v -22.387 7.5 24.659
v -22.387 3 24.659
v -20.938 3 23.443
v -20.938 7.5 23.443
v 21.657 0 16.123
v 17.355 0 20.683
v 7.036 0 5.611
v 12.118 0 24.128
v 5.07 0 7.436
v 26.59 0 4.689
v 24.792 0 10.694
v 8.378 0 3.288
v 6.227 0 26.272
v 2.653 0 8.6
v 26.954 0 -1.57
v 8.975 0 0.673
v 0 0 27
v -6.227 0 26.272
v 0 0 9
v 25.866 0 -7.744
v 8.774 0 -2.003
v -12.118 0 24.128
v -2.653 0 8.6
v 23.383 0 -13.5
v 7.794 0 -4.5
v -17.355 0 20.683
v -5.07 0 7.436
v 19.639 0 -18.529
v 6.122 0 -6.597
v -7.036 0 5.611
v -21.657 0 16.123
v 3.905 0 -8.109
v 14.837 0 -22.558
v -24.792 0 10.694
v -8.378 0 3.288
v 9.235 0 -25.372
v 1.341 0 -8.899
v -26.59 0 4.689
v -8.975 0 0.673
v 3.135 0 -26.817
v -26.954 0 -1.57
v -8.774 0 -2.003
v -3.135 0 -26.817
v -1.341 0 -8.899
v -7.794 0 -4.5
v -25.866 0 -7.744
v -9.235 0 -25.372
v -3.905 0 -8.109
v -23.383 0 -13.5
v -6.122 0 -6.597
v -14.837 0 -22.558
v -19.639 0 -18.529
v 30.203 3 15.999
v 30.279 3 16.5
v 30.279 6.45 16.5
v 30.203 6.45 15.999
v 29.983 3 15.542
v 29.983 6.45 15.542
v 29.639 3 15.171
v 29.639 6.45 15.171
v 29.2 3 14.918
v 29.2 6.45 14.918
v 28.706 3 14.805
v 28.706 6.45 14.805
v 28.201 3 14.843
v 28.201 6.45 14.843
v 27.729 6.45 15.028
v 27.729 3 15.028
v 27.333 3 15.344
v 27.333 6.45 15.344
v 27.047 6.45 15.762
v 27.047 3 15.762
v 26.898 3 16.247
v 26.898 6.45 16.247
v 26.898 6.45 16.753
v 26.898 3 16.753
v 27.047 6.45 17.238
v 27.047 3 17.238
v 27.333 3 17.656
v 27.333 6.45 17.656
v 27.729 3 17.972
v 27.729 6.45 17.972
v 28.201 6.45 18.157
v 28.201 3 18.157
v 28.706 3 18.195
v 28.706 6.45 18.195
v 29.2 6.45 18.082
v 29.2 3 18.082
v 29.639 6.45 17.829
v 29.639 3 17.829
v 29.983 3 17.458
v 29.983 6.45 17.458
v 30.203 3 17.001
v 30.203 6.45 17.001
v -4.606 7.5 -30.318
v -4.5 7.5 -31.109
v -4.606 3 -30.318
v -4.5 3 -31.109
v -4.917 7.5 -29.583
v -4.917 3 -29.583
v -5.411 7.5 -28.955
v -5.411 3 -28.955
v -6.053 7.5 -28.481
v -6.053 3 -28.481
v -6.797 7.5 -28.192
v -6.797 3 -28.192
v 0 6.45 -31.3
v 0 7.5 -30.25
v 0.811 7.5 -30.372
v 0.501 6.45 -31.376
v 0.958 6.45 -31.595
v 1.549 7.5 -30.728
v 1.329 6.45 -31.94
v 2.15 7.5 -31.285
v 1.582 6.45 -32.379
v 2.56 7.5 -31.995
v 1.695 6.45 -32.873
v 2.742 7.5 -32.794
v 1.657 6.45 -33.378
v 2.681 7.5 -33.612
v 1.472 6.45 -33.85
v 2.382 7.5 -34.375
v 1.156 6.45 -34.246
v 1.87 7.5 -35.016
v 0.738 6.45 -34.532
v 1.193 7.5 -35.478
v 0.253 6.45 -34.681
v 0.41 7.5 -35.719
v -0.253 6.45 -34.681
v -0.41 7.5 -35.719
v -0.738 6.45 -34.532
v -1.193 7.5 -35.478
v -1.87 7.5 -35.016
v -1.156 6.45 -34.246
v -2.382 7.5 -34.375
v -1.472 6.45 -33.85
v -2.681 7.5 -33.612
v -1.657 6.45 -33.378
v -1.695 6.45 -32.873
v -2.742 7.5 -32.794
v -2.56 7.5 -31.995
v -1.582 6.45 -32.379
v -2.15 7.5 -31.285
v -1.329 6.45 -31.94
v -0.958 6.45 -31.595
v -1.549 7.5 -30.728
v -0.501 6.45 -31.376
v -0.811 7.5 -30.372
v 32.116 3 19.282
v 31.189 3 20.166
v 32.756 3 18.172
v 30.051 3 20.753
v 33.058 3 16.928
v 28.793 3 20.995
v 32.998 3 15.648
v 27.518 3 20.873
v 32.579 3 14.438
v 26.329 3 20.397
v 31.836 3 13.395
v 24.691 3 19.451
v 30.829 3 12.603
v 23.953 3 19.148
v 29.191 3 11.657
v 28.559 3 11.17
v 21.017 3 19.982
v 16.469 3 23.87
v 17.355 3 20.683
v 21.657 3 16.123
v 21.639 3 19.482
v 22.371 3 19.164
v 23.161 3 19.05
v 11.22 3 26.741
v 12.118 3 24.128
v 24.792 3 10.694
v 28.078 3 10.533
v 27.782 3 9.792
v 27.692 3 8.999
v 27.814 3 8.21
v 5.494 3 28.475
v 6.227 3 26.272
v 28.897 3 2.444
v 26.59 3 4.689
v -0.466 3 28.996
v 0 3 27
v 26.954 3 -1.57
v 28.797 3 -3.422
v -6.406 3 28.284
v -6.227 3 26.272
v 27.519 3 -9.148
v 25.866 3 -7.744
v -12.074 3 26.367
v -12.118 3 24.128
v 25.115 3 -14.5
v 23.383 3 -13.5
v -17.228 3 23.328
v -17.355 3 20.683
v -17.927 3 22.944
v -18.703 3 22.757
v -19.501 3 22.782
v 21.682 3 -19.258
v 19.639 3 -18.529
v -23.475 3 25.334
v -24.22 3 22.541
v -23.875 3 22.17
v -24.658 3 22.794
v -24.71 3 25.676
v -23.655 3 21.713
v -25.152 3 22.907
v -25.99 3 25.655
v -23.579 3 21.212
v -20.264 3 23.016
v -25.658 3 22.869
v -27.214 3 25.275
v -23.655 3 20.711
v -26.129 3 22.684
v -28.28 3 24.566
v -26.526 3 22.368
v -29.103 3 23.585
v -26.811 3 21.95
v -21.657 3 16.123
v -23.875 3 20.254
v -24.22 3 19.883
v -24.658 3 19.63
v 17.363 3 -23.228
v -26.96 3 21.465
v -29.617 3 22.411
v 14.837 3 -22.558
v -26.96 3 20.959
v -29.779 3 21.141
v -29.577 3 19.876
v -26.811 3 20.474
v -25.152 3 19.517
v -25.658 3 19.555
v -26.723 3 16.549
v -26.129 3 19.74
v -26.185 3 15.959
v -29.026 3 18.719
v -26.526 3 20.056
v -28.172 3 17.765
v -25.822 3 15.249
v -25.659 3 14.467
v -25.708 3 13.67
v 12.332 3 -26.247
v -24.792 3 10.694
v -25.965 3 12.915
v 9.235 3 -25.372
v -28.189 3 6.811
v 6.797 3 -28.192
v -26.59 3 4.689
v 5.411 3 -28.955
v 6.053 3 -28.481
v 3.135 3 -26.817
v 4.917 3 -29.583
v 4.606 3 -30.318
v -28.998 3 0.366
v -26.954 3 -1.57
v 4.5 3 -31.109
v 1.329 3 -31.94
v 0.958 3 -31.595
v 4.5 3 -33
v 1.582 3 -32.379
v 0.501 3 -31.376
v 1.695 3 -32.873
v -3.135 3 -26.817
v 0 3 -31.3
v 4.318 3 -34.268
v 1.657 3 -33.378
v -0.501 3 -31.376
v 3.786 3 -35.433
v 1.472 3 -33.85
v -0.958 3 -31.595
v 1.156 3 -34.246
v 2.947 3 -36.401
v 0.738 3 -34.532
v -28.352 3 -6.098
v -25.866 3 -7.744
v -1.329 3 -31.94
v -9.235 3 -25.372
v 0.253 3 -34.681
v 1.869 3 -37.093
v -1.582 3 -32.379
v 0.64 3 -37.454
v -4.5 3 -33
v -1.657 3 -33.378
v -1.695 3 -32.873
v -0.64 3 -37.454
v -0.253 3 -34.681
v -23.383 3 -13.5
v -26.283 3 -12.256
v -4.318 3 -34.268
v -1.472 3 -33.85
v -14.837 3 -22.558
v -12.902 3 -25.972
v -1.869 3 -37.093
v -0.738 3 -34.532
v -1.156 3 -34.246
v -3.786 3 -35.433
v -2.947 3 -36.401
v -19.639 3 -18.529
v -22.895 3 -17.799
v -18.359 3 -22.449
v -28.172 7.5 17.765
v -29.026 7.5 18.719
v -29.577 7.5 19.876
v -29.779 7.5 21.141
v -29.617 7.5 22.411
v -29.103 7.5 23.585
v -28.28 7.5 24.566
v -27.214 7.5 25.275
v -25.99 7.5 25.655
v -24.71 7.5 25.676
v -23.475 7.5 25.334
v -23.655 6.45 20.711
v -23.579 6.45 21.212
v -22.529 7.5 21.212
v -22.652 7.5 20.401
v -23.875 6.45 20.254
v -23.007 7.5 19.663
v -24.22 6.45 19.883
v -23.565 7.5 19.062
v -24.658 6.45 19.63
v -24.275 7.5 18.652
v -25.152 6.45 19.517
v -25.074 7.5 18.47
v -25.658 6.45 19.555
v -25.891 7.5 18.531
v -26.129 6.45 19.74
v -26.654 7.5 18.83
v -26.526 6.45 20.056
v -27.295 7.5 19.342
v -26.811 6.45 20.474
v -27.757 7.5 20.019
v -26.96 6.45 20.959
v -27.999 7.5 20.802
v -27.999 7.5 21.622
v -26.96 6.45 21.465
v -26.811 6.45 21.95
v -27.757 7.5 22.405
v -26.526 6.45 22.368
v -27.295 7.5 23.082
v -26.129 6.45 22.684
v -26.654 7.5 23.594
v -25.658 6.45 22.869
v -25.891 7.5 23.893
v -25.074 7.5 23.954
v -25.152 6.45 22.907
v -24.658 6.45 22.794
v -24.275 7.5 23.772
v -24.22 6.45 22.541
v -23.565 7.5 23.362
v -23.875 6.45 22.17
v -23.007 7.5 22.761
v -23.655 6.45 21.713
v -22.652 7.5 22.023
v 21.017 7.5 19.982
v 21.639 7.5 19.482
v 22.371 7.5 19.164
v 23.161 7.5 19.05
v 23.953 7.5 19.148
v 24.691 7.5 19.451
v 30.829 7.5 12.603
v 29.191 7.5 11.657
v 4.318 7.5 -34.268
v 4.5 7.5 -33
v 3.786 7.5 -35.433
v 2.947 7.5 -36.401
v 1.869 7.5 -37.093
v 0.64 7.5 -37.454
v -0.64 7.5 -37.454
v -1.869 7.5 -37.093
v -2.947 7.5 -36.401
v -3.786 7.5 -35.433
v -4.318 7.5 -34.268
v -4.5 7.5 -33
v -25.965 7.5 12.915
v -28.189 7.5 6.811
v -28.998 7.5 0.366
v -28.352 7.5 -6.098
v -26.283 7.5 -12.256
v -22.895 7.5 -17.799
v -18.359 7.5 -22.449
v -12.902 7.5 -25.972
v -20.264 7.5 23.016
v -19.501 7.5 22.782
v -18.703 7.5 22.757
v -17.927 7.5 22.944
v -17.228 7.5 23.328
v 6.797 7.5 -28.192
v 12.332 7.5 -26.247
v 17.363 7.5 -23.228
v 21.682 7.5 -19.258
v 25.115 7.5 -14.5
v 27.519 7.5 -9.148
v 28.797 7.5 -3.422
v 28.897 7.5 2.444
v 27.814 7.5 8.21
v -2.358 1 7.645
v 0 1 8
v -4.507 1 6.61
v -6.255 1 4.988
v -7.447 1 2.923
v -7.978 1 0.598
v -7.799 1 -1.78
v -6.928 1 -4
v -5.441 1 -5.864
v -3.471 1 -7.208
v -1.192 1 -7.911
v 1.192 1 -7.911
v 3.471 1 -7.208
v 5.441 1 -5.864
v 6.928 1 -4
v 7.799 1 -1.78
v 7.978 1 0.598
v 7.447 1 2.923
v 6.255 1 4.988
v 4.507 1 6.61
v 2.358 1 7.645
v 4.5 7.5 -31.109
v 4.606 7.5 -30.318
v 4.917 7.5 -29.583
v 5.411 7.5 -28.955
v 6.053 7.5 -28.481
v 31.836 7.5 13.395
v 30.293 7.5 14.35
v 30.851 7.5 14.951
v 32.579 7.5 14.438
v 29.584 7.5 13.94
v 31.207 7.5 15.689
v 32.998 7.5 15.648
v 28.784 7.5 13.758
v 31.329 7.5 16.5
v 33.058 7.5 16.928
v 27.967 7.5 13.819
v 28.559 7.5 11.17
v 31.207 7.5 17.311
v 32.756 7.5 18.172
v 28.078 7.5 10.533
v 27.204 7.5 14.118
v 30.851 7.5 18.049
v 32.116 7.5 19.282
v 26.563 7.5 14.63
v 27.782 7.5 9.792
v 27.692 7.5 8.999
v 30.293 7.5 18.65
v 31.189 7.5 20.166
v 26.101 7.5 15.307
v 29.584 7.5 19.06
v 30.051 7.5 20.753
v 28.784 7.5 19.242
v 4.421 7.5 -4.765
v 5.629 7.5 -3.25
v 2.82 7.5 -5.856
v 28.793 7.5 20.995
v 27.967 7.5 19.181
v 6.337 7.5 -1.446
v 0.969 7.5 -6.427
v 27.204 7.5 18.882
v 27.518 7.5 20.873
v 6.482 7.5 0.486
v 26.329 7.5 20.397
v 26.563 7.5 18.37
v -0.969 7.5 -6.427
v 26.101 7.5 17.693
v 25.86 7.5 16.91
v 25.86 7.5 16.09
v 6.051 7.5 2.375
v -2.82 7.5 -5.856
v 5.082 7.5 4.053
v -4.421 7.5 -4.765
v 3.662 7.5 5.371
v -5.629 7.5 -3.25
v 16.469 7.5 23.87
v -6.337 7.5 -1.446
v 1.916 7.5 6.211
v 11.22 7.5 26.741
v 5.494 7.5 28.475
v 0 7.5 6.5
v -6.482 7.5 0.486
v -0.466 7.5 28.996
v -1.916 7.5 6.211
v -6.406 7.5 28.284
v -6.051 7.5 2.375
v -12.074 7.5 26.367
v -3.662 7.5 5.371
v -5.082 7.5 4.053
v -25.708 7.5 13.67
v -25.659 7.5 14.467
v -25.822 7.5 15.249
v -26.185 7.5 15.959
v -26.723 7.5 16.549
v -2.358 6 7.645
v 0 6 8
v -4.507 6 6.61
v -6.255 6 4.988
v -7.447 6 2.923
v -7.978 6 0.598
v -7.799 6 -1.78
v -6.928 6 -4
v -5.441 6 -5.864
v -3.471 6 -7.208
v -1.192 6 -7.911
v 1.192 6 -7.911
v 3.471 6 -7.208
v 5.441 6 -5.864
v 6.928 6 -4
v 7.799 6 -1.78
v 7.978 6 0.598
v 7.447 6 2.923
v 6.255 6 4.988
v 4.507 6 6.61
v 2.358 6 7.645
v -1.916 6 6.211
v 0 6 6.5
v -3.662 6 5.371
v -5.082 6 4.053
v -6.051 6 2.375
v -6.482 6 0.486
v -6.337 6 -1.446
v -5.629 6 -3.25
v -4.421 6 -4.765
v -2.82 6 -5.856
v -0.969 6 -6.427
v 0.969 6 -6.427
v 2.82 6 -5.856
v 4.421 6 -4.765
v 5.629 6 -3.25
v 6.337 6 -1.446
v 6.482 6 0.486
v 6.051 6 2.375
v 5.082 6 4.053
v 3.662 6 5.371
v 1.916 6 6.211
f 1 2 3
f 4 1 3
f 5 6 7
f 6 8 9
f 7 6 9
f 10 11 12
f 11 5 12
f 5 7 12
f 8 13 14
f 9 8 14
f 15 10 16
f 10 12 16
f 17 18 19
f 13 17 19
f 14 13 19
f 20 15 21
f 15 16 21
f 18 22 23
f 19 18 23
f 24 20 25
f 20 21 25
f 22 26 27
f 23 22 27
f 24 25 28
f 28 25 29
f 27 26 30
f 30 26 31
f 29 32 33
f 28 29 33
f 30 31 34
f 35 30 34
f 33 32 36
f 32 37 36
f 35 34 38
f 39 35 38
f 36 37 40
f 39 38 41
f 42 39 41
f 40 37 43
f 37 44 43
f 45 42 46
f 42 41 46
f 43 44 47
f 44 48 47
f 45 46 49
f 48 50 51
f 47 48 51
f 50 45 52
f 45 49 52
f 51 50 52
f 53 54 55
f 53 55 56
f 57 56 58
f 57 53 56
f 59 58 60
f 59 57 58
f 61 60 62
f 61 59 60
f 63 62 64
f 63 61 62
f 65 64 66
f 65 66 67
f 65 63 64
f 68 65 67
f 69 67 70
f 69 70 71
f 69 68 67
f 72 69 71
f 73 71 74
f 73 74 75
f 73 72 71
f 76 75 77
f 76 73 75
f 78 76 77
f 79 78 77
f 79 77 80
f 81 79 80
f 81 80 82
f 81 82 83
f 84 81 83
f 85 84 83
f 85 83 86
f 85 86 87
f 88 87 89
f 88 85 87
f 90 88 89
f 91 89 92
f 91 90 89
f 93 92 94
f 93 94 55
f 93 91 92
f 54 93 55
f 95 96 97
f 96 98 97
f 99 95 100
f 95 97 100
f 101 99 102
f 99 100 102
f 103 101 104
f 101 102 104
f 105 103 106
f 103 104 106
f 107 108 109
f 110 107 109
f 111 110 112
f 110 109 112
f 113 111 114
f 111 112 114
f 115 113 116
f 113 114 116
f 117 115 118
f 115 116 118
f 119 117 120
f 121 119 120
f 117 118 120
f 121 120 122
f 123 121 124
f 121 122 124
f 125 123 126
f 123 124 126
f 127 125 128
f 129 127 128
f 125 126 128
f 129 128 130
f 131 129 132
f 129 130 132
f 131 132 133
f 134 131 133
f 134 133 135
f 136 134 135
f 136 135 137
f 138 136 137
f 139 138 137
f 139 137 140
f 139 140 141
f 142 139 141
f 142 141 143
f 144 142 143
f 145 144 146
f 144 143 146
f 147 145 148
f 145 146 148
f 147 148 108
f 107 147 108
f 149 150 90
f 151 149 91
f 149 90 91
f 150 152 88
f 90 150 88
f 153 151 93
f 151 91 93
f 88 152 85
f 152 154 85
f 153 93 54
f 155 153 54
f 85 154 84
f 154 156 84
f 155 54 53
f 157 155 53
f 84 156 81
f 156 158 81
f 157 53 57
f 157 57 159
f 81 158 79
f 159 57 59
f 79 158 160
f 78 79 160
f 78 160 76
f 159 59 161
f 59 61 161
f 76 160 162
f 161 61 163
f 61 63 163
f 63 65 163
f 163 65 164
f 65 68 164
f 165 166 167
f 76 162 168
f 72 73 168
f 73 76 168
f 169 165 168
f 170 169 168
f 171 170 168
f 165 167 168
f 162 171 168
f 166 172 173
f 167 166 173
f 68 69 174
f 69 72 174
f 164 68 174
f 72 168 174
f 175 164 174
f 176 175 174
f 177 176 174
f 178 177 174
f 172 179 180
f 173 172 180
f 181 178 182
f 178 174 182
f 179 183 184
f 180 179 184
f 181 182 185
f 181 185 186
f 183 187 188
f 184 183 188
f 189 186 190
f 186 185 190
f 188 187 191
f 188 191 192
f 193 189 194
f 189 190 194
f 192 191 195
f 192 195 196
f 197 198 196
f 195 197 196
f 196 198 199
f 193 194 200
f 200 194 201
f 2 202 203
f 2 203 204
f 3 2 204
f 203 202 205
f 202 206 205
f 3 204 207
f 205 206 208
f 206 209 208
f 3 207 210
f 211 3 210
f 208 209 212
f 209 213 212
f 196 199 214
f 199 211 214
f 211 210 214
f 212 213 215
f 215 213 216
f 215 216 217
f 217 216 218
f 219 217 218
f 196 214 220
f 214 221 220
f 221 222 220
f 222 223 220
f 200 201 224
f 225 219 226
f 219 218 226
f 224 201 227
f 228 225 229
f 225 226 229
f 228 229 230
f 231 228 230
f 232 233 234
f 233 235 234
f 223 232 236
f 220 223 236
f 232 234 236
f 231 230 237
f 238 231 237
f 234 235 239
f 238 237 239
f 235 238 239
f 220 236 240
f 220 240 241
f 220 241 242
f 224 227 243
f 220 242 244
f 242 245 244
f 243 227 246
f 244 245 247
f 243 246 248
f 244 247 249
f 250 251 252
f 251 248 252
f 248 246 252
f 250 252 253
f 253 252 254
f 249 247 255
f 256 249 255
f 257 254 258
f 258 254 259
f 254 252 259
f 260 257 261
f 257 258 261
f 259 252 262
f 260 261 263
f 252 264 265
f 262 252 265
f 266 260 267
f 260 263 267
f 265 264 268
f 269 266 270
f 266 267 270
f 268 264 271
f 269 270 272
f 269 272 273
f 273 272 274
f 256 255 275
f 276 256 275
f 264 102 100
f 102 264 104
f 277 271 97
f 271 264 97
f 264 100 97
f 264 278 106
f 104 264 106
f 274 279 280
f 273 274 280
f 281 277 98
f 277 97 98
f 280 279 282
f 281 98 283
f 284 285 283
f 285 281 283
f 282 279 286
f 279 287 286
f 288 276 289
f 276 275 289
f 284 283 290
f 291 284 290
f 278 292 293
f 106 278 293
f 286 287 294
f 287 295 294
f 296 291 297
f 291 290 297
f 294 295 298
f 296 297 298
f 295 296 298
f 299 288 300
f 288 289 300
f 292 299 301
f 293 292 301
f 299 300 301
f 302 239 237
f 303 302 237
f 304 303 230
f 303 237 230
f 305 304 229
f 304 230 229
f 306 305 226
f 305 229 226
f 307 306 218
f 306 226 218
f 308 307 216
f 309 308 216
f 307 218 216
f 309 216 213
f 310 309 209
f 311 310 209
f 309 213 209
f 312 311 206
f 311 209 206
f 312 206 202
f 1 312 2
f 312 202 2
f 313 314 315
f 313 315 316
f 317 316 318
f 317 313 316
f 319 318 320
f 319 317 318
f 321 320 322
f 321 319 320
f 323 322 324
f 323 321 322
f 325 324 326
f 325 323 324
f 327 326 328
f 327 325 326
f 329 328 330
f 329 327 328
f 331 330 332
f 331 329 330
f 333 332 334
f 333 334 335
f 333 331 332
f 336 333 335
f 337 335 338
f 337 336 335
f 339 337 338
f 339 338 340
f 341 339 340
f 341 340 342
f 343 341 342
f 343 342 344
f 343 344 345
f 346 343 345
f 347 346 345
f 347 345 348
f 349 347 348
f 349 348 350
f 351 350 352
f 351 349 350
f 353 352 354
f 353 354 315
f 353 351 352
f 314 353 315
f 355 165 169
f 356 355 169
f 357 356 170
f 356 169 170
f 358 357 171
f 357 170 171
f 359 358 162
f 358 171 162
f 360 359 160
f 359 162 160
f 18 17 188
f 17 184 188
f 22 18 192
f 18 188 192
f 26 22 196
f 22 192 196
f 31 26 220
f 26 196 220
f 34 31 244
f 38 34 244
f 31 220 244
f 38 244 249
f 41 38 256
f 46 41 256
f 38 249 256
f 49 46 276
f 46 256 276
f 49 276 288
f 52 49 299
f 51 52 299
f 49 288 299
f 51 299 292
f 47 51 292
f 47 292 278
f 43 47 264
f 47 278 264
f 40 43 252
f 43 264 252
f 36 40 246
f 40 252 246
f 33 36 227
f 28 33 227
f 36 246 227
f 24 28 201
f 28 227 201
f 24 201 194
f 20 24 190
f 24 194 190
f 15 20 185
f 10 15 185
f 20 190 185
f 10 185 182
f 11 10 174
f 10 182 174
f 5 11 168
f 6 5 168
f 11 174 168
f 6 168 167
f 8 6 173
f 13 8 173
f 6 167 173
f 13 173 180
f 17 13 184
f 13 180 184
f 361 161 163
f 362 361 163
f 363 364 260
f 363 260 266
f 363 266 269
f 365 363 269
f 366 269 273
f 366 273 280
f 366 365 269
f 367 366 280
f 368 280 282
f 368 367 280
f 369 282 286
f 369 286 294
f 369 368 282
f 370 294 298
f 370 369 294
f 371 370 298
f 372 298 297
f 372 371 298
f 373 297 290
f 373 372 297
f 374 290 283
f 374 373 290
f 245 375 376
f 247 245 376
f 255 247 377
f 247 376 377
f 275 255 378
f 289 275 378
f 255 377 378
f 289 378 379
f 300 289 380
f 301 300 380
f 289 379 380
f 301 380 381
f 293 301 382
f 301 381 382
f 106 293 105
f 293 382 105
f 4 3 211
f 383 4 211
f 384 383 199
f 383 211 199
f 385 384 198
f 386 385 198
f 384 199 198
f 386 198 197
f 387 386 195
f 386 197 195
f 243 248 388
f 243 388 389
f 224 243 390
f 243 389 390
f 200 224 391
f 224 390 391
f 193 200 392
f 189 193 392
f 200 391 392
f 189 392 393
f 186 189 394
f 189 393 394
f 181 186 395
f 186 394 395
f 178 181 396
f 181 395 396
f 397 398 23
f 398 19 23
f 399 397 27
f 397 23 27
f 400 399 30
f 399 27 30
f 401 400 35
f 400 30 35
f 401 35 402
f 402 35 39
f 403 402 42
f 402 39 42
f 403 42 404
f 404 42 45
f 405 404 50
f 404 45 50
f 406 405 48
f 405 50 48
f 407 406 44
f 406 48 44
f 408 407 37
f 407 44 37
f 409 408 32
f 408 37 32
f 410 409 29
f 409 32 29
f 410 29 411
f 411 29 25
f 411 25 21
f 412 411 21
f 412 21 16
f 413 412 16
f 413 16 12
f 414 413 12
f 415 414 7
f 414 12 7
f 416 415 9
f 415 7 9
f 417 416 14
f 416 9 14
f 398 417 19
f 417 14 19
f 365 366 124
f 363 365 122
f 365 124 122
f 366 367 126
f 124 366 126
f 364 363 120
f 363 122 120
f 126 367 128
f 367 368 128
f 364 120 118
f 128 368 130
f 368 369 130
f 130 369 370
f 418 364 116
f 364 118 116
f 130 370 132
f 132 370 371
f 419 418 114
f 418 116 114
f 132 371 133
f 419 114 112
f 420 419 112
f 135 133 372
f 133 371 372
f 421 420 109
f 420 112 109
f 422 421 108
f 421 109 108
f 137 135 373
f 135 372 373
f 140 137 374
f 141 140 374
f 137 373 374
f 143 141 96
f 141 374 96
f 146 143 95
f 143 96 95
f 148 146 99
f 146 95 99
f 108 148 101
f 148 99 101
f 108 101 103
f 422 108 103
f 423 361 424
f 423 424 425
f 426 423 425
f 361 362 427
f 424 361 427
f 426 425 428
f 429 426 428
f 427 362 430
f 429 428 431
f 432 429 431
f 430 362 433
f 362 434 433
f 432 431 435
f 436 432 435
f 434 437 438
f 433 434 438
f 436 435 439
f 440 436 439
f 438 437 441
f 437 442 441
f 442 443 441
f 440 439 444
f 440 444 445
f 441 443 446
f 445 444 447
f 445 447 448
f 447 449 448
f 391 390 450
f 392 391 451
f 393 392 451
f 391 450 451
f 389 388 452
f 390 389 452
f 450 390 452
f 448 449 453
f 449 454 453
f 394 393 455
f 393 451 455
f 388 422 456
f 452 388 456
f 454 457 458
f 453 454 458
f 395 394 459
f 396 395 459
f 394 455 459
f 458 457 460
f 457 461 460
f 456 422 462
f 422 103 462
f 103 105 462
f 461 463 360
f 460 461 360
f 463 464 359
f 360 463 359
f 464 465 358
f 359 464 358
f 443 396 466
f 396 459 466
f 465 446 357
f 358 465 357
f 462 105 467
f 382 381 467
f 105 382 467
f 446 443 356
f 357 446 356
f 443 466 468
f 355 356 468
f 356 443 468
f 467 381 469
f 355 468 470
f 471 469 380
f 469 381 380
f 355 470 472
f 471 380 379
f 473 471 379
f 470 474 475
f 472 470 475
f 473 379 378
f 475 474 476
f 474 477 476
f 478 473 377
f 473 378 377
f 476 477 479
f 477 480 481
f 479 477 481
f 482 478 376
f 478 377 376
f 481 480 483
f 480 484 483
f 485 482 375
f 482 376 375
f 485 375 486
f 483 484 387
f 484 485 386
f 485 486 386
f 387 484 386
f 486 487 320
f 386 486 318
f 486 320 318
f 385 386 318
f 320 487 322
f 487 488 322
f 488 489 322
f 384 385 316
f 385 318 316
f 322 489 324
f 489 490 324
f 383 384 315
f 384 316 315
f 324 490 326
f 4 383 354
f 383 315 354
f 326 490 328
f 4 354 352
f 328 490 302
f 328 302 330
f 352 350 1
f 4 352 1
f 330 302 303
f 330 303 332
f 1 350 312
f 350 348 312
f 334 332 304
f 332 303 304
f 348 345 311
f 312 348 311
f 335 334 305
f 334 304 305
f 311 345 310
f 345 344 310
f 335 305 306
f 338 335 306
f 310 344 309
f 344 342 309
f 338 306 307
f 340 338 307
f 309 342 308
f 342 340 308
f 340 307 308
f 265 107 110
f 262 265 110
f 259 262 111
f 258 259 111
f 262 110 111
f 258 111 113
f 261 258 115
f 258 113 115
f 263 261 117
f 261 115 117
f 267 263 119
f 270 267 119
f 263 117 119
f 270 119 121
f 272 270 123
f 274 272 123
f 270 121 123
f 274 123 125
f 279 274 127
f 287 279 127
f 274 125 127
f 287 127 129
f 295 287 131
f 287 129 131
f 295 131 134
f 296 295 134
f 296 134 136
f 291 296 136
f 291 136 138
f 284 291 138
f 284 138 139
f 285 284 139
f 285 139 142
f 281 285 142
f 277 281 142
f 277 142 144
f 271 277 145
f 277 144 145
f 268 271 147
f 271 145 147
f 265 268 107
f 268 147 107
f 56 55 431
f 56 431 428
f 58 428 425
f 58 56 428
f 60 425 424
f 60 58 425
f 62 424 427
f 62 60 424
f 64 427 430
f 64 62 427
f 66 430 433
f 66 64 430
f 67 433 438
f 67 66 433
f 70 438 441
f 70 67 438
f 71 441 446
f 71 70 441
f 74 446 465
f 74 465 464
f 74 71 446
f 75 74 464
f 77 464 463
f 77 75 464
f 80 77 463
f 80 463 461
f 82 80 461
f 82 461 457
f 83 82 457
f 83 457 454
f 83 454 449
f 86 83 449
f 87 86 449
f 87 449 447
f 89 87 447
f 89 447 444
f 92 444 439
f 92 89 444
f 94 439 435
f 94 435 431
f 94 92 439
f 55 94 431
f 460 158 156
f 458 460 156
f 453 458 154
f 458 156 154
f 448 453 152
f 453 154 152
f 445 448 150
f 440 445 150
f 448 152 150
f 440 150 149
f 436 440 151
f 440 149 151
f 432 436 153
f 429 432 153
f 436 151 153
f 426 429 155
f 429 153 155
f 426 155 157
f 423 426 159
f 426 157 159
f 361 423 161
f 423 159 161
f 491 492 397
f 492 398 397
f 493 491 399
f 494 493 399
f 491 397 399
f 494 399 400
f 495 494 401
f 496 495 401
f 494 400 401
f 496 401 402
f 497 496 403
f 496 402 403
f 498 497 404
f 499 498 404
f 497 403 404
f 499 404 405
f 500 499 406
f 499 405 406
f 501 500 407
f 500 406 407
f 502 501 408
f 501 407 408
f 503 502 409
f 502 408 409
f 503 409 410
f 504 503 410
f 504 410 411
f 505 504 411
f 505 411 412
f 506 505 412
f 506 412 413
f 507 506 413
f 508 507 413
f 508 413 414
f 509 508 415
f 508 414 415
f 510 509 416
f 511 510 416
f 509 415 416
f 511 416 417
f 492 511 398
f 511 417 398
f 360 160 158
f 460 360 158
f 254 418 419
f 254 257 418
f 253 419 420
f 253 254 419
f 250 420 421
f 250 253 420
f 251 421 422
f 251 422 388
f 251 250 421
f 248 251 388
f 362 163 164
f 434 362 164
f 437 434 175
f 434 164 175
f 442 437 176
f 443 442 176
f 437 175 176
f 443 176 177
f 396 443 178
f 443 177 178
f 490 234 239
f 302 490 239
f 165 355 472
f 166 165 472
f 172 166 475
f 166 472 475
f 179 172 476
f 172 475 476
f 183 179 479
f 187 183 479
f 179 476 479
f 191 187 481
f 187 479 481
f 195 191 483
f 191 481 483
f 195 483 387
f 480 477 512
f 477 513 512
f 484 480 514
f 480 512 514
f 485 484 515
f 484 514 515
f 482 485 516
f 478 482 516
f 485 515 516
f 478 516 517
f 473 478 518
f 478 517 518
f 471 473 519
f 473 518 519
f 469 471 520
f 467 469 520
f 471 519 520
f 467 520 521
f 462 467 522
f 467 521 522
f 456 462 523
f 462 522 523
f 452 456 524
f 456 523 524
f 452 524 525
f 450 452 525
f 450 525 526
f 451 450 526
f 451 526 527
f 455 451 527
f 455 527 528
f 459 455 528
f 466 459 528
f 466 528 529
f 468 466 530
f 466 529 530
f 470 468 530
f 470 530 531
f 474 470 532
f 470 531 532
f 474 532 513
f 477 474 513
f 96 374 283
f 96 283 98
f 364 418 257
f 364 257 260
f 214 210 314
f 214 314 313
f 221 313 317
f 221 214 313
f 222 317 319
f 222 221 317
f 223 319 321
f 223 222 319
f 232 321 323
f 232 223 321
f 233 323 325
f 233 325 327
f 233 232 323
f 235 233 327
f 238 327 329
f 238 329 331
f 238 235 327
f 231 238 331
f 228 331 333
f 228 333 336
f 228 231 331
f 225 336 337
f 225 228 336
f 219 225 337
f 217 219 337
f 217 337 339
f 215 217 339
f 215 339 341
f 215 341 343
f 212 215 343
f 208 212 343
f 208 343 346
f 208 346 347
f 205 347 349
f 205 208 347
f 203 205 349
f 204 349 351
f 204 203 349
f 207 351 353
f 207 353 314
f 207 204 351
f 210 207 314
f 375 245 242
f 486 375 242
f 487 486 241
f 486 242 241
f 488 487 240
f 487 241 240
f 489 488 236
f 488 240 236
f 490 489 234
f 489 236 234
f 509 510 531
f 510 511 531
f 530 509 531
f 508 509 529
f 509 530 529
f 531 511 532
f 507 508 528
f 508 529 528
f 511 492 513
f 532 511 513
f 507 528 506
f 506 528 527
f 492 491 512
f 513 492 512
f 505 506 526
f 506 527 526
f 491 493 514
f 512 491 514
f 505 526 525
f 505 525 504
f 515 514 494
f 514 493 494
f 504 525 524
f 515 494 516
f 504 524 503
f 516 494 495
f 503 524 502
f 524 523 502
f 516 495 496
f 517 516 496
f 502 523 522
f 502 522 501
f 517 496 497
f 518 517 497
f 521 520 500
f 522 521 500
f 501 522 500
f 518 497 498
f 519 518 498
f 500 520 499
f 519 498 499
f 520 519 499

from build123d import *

# Parameters (mm, degrees)
ESQUISSE1_R                      = 1.7
BOSS_EXTRU_1_DEPTH               = 4.5
CONG_1_R                         = 3
R_P_TITION_START                 = 3
R_P_TITION_CIRCULAIRE1_OUTLINE_R = 1.7
R_P_TITION_CIRCULAIRE1_DEPTH     = 4.5
CHANFREIN1_SIZE                  = 1.05


# Read off the part's stored shape, not the designer's step: Répétition circulaire1
with BuildPart() as part:
    # Sketch1 → Revolve1 (revolve)
    with BuildSketch(Plane.XY, mode=Mode.PRIVATE) as revolve1_sk:
        Polygon((9, 0), (27, 0), (27, 3), (29, 3), (29, 7.5), (6.5, 7.5), (6.5, 6), (8, 6), (8, 1), align=None)
    revolve(revolve1_sk.sketch.rotate(Axis((0, 16.318563478, 0), (0, -1, 0)), 90), axis=Axis((0, 16.318563478, 0), (0, -1, 0)))

    # Esquisse1 → Boss.-Extru.1 (add)
    with BuildSketch(Plane(origin=(0, 7.5, 0), x_dir=(1, 0, 0), z_dir=(0, 1, 0))):
        with BuildLine():
            Line((-4.5, 33), (-4.5, 28.648734702))
            ThreePointArc((-4.5, 28.648734702), (0, 29), (4.5, 28.648734702))
            Line((4.5, 28.648734702), (4.5, 33))
            ThreePointArc((4.5, 33), (0, 37.5), (-4.5, 33))
        make_face()
        with Locations(Location((0, 33, 0), (0, 0, 270))):
            Circle(ESQUISSE1_R, mode=Mode.SUBTRACT)
    extrude(amount=-BOSS_EXTRU_1_DEPTH)

    # Congé1
    cong_1_edges = [part.edges().sort_by_distance(p)[0] for p in [
        (-4.5, 5.25, -28.648734702),
        (4.5, 5.25, -28.648734702),
    ]]
    fillet(cong_1_edges, radius=CONG_1_R)

    # Répétition circulaire1 outline → Répétition circulaire1 (add)
    # profile 1 of 2: a face of its own
    with BuildSketch(Plane(origin=(0, 0, 0), x_dir=(1, 0, 0), z_dir=(0, 1, 0)).offset(R_P_TITION_START)):
        with BuildLine():
            ThreePointArc((26.328838325, -20.397114317), (32.475952642, -18.75), (30.828838325, -12.602885683))
            Line((30.828838325, -12.602885683), (29.190907557, -11.657225913))
            ThreePointArc((29.190907557, -11.657225913), (27.905010686, -10.172154026), (27.813634974, -8.209854417))
            ThreePointArc((27.813634974, -8.209854417), (25.11473671, -14.5), (21.016759974, -19.98238725))
            ThreePointArc((21.016759974, -19.98238725), (22.761849141, -19.080371134), (24.690907557, -19.451454547))
            Line((24.690907557, -19.451454547), (26.328838325, -20.397114317))
        make_face()
        with Locations((28.578838325, -16.5)):
            Circle(R_P_TITION_CIRCULAIRE1_OUTLINE_R, mode=Mode.SUBTRACT)
    # profile 2 of 2: a face of its own
    with BuildSketch(Plane(origin=(0, 0, 0), x_dir=(1, 0, 0), z_dir=(0, 1, 0)).offset(R_P_TITION_START)):
        with BuildLine():
            ThreePointArc((-20.938087556, -23.443474348), (-19.10277383, -22.743051047), (-17.227563034, -23.328331957))
            ThreePointArc((-17.227563034, -23.328331957), (-22.21528885, -18.640840681), (-25.965457103, -12.914915309))
            ThreePointArc((-25.965457103, -12.914915309), (-25.714694862, -14.863270403), (-26.723176043, -16.54907436))
            Line((-26.723176043, -16.54907436), (-28.172010867, -17.764791126))
            ThreePointArc((-28.172010867, -17.764791126), (-28.726666617, -24.104535364), (-22.386922379, -24.659191114))
            Line((-22.386922379, -24.659191114), (-20.938087556, -23.443474348))
        make_face()
        with Locations((-25.279466623, -21.21199112)):
            Circle(R_P_TITION_CIRCULAIRE1_OUTLINE_R, mode=Mode.SUBTRACT)
    extrude(amount=R_P_TITION_CIRCULAIRE1_DEPTH)

    # Chanfrein1
    chanfrein1_edges = [part.edges().sort_by_distance(p)[0] for p in [
        (0, 7.5, -34.7),
        (26.878838325, 7.5, 16.5),
        (-26.979466623, 7.5, 21.21199112),
    ]]
    chamfer(chanfrein1_edges, length=CHANFREIN1_SIZE)


solid = part.part
